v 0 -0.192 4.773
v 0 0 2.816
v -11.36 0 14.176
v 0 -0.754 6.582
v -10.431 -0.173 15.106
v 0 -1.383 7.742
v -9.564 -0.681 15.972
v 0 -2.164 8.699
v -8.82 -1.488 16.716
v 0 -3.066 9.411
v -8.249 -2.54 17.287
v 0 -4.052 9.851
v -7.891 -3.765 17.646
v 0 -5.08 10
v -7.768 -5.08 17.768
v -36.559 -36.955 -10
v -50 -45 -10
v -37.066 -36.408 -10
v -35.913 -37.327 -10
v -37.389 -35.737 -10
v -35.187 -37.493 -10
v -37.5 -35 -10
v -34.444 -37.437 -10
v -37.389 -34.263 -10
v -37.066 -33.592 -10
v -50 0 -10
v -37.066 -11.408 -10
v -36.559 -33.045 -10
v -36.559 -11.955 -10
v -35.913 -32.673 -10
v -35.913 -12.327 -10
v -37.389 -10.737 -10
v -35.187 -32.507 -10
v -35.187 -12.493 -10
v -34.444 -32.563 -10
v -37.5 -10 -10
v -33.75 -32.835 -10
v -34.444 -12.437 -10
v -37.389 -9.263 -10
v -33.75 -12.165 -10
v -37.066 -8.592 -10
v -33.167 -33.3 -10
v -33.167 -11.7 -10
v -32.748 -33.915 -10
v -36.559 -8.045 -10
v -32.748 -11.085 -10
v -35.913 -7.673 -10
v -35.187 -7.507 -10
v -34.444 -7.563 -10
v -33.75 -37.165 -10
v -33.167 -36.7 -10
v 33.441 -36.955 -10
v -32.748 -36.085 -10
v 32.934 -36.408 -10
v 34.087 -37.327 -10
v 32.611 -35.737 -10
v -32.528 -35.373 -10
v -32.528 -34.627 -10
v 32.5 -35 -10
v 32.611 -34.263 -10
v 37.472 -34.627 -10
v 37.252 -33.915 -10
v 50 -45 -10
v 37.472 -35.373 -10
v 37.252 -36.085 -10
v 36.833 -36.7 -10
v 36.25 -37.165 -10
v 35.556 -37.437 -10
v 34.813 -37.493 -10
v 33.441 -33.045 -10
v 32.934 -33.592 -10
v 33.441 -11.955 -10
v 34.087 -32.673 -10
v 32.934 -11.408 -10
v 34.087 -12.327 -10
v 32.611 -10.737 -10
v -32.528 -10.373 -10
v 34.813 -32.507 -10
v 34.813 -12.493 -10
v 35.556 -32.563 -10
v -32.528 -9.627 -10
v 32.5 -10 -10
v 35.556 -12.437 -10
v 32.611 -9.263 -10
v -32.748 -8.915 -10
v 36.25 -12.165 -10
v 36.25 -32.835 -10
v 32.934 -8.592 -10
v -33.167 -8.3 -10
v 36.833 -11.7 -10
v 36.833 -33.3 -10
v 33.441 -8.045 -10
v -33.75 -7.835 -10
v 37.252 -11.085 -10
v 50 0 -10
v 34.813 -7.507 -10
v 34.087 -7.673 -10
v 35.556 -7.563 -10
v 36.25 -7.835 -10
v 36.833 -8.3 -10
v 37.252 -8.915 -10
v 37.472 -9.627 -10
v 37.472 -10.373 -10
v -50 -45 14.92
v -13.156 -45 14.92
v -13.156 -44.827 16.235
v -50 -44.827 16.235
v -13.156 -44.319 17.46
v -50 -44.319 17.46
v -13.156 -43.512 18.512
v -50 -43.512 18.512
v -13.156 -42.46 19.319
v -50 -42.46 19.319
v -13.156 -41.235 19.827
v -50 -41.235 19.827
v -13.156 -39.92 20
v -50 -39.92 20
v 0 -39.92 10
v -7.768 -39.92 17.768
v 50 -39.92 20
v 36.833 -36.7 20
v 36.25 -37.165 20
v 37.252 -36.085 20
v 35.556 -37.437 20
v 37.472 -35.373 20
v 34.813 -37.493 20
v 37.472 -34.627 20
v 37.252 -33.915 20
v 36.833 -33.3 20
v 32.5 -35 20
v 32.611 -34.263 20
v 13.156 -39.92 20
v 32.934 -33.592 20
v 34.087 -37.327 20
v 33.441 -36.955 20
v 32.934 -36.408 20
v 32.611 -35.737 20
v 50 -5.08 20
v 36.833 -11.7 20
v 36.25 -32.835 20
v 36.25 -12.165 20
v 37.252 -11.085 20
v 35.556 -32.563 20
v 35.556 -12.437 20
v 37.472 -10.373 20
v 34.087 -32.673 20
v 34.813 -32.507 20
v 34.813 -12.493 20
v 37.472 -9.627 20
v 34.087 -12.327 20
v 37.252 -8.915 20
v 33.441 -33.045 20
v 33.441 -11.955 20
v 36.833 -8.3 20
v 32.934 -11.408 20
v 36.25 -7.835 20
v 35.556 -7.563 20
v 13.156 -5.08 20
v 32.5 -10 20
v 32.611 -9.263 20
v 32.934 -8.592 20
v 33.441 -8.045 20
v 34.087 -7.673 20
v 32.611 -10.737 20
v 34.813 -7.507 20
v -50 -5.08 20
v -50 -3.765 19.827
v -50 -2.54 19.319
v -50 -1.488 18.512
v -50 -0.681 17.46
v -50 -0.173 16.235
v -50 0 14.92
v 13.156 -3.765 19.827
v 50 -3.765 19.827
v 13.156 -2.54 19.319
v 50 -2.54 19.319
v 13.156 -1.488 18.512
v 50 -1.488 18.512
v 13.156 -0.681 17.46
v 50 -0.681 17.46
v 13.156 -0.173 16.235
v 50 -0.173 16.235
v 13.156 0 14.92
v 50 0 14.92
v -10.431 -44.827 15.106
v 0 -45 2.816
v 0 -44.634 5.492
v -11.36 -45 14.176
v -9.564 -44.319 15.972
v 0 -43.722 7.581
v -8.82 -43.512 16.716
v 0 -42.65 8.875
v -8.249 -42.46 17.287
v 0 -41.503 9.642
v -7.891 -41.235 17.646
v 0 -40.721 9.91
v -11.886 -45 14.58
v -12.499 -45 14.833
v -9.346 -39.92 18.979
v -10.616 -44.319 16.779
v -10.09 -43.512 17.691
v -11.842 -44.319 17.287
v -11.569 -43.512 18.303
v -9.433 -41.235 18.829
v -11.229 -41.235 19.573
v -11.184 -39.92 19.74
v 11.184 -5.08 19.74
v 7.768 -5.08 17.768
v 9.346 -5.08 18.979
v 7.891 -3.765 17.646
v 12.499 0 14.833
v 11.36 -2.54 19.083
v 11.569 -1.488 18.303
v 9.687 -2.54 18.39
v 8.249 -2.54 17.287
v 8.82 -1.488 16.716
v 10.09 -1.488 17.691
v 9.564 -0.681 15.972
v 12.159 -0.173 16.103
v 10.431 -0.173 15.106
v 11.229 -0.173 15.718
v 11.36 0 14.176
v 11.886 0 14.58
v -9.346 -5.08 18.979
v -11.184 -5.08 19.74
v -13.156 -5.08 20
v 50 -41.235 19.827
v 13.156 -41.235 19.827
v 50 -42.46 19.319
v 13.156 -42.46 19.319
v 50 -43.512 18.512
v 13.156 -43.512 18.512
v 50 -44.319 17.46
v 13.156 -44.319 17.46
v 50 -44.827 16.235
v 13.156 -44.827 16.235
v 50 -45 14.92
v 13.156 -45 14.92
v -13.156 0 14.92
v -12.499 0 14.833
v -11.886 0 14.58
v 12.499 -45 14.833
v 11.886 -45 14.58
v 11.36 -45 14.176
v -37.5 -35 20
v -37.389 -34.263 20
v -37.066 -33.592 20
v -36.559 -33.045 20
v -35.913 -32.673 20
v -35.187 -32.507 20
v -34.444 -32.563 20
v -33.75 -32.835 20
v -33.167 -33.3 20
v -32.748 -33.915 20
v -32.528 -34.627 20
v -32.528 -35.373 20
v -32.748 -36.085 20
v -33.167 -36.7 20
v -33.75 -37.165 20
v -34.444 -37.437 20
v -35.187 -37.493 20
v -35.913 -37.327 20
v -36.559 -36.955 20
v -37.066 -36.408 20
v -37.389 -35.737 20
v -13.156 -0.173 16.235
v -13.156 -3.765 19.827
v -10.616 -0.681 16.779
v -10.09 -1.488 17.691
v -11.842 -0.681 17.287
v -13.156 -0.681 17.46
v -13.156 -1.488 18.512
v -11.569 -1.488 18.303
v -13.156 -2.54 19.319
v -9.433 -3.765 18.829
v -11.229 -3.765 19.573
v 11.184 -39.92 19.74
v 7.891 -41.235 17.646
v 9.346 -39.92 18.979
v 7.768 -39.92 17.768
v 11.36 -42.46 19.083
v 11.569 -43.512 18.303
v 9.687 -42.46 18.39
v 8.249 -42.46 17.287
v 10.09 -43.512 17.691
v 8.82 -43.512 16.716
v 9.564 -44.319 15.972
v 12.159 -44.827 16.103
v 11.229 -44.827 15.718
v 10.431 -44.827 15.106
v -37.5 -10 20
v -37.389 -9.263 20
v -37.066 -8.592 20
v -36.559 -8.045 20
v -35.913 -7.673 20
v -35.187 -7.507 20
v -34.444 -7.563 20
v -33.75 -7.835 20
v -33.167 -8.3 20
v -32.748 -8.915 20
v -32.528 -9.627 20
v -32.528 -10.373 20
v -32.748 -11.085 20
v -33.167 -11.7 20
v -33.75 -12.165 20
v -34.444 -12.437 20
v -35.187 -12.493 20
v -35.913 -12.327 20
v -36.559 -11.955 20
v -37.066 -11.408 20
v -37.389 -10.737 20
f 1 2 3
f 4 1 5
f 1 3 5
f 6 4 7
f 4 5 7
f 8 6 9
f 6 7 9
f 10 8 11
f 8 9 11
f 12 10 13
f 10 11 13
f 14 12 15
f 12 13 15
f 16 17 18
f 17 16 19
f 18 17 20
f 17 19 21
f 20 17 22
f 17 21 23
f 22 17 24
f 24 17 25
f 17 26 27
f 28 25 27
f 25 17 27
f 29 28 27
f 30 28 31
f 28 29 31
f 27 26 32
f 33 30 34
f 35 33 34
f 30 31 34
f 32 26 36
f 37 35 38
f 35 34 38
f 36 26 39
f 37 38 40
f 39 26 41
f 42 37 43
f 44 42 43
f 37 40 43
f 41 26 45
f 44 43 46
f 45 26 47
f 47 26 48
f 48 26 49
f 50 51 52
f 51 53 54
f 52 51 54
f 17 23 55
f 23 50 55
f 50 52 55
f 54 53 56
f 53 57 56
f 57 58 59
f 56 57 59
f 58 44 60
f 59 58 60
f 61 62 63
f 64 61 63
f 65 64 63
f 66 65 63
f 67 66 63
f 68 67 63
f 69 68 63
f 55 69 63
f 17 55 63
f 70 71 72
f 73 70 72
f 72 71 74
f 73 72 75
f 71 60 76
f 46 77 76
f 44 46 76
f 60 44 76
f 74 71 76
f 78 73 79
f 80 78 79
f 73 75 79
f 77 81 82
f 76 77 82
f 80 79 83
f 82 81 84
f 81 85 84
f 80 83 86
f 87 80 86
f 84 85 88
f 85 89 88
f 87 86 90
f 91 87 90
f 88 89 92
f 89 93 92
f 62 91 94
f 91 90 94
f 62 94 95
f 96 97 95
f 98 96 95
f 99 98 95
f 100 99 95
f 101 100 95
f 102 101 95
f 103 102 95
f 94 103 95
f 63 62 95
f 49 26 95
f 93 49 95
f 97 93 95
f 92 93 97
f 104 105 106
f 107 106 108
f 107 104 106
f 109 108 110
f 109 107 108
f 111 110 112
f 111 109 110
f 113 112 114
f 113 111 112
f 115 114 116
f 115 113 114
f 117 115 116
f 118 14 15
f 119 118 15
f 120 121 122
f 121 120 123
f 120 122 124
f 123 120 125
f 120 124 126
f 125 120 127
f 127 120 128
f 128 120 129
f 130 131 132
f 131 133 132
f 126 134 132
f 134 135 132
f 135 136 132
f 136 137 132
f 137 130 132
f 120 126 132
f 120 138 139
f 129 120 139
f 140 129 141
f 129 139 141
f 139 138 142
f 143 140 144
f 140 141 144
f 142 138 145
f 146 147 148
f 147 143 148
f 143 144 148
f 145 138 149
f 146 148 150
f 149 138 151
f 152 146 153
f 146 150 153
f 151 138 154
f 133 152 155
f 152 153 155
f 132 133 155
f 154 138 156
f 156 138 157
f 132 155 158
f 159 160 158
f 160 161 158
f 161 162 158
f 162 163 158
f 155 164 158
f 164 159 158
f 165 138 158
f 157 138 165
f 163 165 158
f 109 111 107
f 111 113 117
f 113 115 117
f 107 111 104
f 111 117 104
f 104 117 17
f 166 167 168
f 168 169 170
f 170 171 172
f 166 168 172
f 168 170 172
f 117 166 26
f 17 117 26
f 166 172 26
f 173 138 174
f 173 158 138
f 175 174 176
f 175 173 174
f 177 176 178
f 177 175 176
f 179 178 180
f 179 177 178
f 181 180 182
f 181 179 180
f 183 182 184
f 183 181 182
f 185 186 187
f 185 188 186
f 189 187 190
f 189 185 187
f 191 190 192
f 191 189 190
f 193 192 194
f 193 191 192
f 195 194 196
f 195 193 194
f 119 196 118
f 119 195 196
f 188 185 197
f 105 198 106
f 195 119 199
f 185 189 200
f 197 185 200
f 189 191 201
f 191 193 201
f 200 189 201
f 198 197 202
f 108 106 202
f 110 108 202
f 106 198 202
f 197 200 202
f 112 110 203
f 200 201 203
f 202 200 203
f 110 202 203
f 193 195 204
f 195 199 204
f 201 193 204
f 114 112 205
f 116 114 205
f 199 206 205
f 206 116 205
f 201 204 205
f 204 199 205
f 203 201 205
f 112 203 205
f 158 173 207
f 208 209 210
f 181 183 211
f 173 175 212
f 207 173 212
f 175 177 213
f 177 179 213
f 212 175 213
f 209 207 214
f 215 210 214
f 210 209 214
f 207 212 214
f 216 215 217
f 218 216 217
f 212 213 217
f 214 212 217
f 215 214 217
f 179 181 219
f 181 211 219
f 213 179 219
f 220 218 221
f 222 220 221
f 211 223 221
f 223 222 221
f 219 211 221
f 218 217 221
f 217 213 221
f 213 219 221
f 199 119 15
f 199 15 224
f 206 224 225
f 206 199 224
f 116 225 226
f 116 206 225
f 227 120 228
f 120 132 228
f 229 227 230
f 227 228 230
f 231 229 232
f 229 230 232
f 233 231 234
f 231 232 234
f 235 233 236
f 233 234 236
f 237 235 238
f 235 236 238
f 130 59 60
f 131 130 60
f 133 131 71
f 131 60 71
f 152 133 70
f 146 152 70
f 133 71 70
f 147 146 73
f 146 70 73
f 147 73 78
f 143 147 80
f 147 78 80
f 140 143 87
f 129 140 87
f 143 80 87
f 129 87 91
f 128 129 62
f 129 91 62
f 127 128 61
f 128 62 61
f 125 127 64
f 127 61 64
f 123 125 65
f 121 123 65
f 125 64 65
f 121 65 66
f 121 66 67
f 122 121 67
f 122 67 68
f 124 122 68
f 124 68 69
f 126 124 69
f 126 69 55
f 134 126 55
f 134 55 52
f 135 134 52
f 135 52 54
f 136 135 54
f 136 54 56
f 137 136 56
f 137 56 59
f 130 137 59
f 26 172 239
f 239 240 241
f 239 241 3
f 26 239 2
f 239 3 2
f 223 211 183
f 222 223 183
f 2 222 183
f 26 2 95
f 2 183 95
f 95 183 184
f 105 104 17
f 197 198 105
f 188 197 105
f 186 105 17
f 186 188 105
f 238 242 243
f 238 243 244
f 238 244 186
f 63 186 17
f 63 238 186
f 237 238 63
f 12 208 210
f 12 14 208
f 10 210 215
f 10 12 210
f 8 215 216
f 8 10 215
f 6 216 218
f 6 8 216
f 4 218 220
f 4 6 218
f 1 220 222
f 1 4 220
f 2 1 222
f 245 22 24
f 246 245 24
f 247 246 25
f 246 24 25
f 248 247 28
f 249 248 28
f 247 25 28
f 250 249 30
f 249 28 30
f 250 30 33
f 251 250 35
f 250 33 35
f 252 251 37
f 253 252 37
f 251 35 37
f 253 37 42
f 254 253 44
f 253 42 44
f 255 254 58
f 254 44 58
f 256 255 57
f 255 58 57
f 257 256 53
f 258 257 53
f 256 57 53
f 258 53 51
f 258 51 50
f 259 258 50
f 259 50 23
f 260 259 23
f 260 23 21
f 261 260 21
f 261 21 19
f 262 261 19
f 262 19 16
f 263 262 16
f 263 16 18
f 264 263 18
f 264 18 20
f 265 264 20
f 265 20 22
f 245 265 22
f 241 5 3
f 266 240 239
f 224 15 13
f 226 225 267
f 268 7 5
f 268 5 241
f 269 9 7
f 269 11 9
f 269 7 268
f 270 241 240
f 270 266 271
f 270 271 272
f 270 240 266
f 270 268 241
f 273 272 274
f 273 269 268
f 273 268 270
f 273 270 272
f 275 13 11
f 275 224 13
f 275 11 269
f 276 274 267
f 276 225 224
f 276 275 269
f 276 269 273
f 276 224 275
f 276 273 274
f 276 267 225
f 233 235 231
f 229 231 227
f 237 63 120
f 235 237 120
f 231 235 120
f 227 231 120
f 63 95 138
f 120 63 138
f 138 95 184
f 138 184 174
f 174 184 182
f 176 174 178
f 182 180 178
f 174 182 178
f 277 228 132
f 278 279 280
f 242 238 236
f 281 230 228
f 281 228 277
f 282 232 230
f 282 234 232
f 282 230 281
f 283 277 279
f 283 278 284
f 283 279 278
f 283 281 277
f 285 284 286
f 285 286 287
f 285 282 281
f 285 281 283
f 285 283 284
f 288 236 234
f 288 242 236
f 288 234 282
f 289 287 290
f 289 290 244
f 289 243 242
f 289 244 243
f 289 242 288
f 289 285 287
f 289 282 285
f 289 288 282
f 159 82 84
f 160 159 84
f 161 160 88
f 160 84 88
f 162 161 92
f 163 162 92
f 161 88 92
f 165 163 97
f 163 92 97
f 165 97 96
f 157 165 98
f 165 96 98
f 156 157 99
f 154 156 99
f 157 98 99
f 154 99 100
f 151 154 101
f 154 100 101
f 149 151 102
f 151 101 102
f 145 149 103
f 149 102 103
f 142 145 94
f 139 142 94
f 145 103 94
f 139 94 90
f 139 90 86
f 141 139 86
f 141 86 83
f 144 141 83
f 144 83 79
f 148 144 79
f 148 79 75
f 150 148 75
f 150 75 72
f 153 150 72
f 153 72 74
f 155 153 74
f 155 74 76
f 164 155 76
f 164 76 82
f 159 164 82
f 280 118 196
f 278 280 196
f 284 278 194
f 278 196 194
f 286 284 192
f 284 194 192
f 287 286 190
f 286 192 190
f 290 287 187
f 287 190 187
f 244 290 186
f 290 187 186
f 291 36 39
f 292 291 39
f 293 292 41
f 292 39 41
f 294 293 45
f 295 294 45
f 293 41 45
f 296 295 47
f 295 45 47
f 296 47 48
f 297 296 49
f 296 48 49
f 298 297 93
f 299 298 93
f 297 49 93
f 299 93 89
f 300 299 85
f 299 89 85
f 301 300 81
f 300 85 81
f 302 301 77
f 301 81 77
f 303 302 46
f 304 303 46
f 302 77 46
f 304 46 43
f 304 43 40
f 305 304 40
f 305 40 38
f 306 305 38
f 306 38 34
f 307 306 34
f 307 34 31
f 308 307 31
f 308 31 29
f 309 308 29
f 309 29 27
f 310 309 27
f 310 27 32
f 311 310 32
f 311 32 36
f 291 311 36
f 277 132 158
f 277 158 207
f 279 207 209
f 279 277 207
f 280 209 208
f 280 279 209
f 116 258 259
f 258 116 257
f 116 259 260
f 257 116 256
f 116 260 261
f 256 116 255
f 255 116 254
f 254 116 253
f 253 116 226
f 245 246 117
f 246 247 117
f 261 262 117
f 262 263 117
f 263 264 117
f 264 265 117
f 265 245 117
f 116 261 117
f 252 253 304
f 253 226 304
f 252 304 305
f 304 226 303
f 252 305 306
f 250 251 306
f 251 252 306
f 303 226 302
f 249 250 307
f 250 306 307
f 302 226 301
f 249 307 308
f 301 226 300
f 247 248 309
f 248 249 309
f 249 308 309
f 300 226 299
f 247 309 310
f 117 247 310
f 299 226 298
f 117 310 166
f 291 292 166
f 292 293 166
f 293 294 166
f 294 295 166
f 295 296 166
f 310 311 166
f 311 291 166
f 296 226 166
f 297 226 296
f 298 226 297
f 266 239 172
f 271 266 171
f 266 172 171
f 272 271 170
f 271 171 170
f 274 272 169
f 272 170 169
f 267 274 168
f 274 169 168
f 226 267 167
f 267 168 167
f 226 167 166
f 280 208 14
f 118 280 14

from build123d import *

# Parameters (mm, degrees)
F1_DEPTH = 45
F3_D     = 5
F5_D     = 5
F7_D     = 5
F9_D     = 5
F10_R    = 7.62
F11_R    = 5.08


with BuildPart() as f1:
    # F0 (on Front) → F1 (new body)
    with BuildSketch(Plane.XZ):
        Polygon((50, 20), (20, 20), (10, 20), (0, 10), (-10, 20), (-20, 20), (-50, 20), (-50, 0), (-50, -10), (50, -10), (50, 0), align=None)
    extrude(amount=F1_DEPTH)

    # F3 (through all)
    with Locations(Plane.XY.offset(20)):
        with Locations((35, -35)):
            Hole(F3_D / 2)

    # F5 (through all)
    with Locations(Plane.XY.offset(20)):
        with Locations((35, -10)):
            Hole(F5_D / 2)

    # F7 (through all)
    with Locations(Plane.XY.offset(20)):
        with Locations((-35, -10)):
            Hole(F7_D / 2)

    # F9 (through all)
    with Locations(Plane.XY.offset(20)):
        with Locations((-35, -35)):
            Hole(F9_D / 2)

    # F10
    f10_edges = [f1.edges().sort_by_distance(p)[0] for p in [
        (10, -22.5, 20),
        (-10, -22.5, 20),
    ]]
    fillet(f10_edges, radius=F10_R)

    # F11
    f11_edges = [f1.edges().sort_by_distance(p)[0] for p in [
        (-31.578154, -45, 20),
        (31.578154, -45, 20),
        (31.578154, 0, 20),
        (-31.578154, 0, 20),
    ]]
    fillet(f11_edges, radius=F11_R)


solid = f1.part
